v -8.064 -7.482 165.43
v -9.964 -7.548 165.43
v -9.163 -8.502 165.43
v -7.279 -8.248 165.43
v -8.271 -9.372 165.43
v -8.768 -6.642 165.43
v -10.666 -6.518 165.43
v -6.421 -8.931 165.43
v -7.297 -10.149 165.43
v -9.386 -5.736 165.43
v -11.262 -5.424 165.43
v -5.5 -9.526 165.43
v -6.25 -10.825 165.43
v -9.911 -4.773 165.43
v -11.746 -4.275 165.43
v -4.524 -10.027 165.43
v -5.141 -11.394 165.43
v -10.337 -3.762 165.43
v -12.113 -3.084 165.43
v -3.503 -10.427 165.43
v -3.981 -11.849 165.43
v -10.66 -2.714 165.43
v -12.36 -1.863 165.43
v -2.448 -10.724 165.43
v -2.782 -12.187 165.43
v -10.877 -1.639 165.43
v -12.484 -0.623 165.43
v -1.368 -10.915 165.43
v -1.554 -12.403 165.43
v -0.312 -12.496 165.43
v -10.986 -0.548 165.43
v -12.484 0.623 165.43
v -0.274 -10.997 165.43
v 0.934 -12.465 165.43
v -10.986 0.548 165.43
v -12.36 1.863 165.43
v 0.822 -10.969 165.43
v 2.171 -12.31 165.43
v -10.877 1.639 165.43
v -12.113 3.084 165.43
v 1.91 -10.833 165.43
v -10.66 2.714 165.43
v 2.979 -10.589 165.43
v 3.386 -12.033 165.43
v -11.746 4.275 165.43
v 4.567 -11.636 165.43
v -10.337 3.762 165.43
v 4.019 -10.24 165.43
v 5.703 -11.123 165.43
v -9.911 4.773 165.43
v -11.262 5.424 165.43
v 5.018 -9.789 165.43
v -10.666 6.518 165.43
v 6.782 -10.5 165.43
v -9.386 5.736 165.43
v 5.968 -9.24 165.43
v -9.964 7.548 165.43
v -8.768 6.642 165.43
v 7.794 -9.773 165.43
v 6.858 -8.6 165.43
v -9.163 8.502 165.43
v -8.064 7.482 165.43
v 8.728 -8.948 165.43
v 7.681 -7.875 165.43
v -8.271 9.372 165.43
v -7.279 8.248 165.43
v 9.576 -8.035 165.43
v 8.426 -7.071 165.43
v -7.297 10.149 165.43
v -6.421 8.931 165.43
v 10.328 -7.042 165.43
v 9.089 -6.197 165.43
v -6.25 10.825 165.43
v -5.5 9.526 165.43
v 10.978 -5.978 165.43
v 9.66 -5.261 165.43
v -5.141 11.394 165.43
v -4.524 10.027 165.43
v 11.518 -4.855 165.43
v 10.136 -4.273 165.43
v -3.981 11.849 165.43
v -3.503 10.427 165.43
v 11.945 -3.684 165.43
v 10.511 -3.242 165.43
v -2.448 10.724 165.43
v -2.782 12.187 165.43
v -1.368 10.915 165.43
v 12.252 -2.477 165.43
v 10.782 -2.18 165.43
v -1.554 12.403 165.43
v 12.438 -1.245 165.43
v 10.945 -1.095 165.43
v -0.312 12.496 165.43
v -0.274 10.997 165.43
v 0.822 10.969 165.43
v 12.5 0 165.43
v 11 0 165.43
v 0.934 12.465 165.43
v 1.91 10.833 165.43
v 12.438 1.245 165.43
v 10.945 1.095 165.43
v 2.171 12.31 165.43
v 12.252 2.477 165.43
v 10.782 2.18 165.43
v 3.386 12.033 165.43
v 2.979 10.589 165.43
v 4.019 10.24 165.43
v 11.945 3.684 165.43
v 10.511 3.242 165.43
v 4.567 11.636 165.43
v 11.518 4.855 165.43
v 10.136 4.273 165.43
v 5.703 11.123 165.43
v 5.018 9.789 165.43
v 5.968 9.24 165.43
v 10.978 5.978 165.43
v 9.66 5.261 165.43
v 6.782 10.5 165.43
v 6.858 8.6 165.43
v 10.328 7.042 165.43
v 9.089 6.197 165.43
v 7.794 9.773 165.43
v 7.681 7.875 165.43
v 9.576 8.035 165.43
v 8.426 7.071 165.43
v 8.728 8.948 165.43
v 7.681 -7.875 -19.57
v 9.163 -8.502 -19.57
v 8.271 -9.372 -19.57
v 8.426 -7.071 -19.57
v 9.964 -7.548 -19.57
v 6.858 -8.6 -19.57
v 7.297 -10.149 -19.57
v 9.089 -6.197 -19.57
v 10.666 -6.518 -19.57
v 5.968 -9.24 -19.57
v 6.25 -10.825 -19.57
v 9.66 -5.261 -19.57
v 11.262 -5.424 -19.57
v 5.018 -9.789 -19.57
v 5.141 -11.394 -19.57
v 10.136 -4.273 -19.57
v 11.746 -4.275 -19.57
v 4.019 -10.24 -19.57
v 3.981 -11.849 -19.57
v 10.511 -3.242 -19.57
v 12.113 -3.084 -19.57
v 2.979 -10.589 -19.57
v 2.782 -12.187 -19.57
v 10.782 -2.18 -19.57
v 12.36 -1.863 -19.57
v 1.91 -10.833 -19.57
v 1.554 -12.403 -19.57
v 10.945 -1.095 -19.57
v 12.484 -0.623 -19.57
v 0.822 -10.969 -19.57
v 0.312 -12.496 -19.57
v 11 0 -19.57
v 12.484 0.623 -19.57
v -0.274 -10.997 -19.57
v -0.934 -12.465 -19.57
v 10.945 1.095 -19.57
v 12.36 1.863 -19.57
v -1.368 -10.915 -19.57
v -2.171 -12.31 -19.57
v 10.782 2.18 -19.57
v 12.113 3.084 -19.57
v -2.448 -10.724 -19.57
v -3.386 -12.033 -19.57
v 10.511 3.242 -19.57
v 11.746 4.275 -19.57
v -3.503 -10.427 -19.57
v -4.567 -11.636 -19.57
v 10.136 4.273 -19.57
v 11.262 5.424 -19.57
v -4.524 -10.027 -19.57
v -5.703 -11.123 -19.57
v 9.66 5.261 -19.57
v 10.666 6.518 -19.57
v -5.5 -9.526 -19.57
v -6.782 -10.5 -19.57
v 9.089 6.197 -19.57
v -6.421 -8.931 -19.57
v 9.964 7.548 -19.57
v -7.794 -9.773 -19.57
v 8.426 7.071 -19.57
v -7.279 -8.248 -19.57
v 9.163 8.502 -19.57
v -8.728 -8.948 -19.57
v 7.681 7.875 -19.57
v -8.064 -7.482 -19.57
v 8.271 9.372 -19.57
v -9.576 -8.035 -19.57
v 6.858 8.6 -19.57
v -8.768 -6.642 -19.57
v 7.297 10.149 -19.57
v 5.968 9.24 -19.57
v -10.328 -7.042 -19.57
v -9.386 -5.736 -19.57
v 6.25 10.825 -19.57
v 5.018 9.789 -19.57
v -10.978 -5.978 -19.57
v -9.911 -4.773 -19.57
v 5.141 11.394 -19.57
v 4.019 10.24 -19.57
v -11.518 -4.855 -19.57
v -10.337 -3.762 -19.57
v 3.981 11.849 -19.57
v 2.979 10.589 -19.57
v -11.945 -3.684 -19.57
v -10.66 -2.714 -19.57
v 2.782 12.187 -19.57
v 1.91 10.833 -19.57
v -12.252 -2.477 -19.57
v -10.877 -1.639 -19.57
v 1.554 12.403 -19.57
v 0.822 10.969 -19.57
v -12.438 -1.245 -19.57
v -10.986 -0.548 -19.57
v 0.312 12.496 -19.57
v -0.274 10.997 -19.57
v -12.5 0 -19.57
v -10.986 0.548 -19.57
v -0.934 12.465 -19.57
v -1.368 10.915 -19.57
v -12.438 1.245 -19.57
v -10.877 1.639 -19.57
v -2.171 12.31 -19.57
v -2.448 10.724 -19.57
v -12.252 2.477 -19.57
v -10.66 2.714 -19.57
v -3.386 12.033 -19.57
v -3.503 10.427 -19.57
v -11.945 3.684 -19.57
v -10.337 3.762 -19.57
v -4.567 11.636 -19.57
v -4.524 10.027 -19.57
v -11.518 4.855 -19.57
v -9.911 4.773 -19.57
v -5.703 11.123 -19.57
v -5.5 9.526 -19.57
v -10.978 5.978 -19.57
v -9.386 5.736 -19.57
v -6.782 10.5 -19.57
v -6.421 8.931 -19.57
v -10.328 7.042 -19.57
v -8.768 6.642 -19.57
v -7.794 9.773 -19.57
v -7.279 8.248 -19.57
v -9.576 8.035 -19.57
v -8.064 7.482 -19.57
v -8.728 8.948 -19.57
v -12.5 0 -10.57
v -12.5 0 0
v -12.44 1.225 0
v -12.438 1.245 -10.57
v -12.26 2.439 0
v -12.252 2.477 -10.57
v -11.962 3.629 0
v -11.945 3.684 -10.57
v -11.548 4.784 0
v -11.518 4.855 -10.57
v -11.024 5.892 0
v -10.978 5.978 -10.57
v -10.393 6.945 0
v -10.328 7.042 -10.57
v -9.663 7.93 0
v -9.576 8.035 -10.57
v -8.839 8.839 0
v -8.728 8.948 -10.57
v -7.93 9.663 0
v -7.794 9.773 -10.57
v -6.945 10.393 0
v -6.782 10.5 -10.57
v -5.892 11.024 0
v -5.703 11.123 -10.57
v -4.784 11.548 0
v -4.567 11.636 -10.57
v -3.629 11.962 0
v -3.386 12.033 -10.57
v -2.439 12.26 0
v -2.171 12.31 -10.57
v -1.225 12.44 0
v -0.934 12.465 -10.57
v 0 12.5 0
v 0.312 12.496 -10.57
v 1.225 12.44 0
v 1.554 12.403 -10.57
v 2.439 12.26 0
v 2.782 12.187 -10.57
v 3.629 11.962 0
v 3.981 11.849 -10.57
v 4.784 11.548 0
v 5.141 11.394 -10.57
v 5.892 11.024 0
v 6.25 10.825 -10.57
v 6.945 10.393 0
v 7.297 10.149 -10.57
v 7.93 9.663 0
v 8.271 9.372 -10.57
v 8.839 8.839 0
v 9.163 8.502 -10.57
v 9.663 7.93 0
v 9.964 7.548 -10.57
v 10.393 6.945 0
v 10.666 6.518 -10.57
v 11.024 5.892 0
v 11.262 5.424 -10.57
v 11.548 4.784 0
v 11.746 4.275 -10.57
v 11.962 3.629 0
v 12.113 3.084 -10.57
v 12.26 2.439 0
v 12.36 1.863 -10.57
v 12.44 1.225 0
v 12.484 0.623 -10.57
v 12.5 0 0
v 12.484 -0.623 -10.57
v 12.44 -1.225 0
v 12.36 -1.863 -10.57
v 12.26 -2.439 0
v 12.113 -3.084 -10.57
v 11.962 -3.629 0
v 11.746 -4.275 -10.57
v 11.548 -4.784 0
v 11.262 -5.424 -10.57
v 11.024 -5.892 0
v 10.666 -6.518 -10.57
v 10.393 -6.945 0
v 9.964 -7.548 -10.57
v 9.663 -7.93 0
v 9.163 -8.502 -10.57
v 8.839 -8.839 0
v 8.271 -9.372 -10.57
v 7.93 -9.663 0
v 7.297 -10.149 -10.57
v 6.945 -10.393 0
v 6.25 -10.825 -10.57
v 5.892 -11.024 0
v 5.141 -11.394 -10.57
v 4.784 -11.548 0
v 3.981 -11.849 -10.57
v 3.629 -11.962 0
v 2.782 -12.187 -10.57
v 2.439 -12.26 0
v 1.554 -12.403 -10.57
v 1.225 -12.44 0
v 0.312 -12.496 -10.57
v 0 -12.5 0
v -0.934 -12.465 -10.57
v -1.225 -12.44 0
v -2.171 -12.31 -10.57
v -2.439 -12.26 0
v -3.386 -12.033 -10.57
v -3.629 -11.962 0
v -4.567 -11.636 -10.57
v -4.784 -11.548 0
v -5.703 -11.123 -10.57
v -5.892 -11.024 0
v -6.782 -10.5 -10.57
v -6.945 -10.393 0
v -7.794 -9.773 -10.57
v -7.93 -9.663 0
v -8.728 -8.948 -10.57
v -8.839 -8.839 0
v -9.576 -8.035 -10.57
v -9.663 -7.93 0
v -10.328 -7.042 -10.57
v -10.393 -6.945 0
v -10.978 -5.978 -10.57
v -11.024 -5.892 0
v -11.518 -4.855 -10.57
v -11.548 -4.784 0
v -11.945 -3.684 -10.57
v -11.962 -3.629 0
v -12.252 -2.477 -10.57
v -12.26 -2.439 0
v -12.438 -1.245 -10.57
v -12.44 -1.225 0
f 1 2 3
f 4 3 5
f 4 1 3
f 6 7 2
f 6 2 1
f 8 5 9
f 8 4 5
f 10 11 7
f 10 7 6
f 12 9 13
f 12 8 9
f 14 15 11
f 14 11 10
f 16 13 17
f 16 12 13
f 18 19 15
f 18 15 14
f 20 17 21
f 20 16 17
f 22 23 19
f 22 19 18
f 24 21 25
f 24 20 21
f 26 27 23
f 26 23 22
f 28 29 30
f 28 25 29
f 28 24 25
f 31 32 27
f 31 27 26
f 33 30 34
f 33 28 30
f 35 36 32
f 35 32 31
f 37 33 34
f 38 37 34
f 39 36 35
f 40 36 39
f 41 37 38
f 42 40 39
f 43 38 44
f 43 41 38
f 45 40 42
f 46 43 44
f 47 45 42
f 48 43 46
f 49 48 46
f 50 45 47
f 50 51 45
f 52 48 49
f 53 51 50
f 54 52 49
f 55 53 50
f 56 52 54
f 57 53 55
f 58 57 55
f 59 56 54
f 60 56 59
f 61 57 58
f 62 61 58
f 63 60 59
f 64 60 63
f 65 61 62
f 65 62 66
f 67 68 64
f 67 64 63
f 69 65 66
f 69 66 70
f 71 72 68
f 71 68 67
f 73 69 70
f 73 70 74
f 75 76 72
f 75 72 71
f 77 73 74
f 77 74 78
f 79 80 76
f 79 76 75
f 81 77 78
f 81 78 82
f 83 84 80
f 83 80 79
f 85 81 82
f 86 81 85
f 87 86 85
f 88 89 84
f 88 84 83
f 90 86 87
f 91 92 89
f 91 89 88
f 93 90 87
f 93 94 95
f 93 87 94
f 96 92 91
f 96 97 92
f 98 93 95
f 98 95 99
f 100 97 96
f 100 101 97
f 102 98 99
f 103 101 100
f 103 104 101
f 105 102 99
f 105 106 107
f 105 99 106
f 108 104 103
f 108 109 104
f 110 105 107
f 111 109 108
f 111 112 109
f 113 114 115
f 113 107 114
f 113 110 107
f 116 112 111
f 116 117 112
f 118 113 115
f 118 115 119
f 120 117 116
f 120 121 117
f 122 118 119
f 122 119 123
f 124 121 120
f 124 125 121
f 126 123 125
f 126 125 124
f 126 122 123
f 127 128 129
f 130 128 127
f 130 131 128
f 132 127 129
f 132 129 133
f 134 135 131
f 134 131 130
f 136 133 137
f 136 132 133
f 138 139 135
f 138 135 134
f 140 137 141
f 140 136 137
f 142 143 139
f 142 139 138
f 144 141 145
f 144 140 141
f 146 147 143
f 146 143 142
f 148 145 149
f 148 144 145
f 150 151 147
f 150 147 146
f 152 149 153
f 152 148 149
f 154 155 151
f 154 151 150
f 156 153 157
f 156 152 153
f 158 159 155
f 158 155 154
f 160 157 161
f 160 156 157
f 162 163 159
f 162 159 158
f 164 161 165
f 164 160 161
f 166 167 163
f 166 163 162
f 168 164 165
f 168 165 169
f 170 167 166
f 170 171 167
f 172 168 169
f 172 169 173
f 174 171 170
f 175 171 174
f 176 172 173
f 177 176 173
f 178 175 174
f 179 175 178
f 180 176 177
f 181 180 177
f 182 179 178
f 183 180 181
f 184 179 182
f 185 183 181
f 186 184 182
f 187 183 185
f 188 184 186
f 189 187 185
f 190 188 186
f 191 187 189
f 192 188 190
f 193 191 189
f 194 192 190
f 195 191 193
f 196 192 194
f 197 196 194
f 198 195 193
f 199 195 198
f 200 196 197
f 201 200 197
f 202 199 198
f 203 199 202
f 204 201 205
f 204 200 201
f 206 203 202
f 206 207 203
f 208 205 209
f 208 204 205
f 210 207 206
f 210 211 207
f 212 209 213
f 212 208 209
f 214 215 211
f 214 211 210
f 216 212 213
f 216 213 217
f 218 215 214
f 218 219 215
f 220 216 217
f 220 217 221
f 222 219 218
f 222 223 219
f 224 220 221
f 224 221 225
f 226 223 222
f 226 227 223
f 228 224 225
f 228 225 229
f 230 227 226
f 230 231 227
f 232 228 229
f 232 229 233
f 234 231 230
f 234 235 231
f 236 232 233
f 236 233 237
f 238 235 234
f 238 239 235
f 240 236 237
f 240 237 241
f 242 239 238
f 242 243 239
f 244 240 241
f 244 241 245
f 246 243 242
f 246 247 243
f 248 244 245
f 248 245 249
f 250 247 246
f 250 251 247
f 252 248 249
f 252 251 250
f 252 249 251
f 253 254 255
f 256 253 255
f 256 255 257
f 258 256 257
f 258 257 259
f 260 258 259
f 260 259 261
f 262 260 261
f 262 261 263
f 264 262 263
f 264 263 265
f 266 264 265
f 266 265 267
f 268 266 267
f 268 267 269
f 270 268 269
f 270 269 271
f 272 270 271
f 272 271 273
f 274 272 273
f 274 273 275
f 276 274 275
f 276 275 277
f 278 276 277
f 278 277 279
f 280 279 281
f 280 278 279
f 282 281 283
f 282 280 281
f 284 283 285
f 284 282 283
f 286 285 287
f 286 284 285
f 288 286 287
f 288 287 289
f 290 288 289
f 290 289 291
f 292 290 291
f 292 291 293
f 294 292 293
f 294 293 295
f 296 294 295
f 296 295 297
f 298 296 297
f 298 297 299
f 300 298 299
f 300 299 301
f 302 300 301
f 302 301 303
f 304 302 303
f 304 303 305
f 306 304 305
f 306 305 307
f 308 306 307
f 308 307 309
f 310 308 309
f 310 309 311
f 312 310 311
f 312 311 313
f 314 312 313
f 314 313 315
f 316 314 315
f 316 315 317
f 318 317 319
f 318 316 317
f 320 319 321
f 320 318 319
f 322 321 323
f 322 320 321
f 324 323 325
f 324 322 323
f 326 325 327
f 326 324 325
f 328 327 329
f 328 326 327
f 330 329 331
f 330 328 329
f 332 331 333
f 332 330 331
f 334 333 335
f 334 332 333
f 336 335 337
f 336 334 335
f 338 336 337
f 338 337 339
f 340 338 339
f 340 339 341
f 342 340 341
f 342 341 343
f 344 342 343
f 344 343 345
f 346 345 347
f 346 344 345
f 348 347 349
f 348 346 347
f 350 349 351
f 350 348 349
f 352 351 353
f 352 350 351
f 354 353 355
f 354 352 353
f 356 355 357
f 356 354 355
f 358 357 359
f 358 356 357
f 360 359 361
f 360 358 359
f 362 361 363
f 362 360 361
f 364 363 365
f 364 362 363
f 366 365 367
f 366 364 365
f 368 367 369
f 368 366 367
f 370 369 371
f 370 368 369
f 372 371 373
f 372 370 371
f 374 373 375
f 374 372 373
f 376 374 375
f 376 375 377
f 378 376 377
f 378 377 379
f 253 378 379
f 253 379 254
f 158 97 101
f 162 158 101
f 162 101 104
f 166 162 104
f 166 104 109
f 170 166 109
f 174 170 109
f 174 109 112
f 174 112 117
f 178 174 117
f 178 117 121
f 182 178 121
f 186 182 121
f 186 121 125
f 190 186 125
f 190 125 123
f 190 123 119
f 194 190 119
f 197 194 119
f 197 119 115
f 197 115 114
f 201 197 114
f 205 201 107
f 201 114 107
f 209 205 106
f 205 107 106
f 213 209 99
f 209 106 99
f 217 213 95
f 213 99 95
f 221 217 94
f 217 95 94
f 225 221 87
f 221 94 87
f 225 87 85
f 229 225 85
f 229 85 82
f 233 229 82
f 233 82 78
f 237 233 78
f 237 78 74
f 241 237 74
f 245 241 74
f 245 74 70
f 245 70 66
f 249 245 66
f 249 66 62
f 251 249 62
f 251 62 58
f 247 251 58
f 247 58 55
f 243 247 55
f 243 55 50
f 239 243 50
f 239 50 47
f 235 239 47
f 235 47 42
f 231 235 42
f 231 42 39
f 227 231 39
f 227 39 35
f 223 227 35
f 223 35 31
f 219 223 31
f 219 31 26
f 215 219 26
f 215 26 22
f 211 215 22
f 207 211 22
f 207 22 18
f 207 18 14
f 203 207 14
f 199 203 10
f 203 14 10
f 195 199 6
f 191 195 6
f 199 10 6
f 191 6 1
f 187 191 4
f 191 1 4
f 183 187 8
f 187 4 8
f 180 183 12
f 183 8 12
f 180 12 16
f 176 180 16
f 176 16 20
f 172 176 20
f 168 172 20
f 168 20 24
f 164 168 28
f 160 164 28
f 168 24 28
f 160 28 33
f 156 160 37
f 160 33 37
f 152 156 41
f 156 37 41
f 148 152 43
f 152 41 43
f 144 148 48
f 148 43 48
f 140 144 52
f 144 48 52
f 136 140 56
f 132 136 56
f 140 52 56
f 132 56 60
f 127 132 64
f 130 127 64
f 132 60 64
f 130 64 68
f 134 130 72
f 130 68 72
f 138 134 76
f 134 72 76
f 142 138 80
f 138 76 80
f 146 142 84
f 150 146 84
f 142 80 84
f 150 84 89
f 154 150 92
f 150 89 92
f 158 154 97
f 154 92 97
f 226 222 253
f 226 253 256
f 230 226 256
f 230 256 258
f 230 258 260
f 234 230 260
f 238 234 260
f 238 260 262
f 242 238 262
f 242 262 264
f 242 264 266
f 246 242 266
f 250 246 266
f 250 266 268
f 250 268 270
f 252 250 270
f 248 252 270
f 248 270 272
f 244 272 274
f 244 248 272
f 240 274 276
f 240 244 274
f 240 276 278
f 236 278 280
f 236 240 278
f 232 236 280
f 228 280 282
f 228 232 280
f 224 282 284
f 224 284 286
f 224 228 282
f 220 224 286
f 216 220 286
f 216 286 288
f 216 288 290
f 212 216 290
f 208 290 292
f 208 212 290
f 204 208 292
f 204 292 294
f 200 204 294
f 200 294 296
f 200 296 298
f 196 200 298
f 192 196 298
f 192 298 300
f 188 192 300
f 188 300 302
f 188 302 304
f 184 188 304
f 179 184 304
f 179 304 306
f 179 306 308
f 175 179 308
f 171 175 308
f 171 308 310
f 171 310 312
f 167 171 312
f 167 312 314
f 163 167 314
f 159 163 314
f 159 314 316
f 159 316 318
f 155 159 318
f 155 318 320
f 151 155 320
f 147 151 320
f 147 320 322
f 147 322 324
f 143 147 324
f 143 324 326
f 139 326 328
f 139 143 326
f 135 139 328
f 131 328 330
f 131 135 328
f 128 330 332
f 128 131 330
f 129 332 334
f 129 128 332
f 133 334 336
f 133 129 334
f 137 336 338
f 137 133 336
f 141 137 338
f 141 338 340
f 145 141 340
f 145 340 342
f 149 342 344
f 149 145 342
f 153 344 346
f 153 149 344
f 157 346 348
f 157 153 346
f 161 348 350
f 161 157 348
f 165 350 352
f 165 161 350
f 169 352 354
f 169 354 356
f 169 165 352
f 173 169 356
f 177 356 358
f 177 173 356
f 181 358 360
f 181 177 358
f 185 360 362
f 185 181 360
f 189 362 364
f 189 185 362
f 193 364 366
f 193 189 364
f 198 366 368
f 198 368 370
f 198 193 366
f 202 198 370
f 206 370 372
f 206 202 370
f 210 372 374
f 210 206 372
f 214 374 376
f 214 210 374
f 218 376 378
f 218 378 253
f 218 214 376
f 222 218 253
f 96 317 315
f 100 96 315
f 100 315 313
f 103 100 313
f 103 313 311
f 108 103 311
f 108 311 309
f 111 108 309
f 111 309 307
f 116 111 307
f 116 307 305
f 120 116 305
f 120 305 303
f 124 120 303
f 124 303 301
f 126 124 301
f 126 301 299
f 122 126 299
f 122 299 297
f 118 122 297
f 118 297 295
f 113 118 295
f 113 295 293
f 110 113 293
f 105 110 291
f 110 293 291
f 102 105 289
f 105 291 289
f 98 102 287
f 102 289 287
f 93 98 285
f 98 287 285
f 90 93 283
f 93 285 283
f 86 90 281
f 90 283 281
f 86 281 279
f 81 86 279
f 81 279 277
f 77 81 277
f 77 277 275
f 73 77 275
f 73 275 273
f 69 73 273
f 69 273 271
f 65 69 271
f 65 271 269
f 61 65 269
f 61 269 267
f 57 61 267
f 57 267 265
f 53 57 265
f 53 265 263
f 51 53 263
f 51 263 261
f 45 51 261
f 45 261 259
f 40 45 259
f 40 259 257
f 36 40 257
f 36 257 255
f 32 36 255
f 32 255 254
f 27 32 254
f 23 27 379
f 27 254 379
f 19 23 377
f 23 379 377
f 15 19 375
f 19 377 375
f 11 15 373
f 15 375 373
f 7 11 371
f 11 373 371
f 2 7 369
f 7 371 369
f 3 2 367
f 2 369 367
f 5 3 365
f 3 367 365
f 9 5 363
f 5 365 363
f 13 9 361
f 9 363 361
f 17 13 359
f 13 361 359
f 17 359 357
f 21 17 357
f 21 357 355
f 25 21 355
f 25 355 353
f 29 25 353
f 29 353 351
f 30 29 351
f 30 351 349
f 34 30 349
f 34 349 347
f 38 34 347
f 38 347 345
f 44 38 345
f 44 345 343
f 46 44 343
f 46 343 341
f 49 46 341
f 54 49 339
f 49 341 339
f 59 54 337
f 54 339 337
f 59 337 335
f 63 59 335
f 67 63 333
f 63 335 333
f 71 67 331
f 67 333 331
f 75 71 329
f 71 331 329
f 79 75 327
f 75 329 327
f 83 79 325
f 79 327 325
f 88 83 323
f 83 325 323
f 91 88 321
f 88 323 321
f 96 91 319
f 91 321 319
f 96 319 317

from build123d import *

# Parameters (mm, degrees)
SKETCH_1_R           = 12.5
EXTRUDE_2_DEPTH      = 235.43
SKETCH_2_R           = 9
CUT_EXTRUDE_1_DEPTH  = 235.43
EXTRUDE_START        = 15.57
SKETCH_3_R           = 12.5
EXTRUDE_3_DEPTH      = 15.57
SKETCH_4_R           = 9
CUT_EXTRUDE_2_DEPTH  = 20
EXTRUDE_START_2      = 9.93
SKETCH_5_R           = 12.5
EXTRUDE_4_DEPTH      = 9.93
SKETCH_6_R           = 9
CUT_EXTRUDE_3_DEPTH  = 10
SKETCH_7_R           = 26.85848727
CUT_EXTRUDE_4_DEPTH  = 14.93
SKETCH_8_R           = 12.5
EXTRUDE_5_DEPTH      = 9.93
SKETCH_9_R           = 9
CUT_EXTRUDE_5_DEPTH  = 10
SKETCH_10_R          = 37.193394561
CUT_EXTRUDE_6_DEPTH  = 0.22
SKETCH_11_R          = 43.187188263
CUT_EXTRUDE_7_DEPTH  = 0.71
SKETCH_12_R          = 12.5
EXTRUDE_6_DEPTH      = 15
CUT_EXTRUDE_START    = -15
SKETCH_13_R          = 9
CUT_EXTRUDE_8_DEPTH  = 15
SKETCH_14_R          = 46.427055536
CUT_EXTRUDE_9_DEPTH  = 85
SKETCH_15_R          = 11
CUT_EXTRUDE_10_DEPTH = 324


with BuildPart() as part:
    # 草图1 → 凸台-拉伸2 (new body)
    with BuildSketch(Plane.XY):
        Circle(SKETCH_1_R)
    extrude(amount=EXTRUDE_2_DEPTH)

    # 草图2 → 切除-拉伸1 (cut)
    with BuildSketch(Plane(origin=(0, 0, 0), x_dir=(-1, 0, 0), z_dir=(0, 0, -1))):
        Circle(SKETCH_2_R)
    extrude(amount=-CUT_EXTRUDE_1_DEPTH, mode=Mode.SUBTRACT)

    # 草图3 → 凸台-拉伸3 (add)
    with BuildSketch(Plane(origin=(0, 0, 0), x_dir=(-1, 0, 0), z_dir=(0, 0, -1)).offset(EXTRUDE_START)):
        Circle(SKETCH_3_R)
    extrude(amount=-EXTRUDE_3_DEPTH)

    # 草图4 → 切除-拉伸2 (cut)
    with BuildSketch(Plane(origin=(0, 0, -15.57), x_dir=(-1, 0, 0), z_dir=(0, 0, -1))):
        Circle(SKETCH_4_R)
    extrude(amount=-CUT_EXTRUDE_2_DEPTH, mode=Mode.SUBTRACT)

    # 草图5 → 凸台-拉伸4 (add)
    with BuildSketch(Plane(origin=(0, 0, -15.57), x_dir=(-1, 0, 0), z_dir=(0, 0, -1)).offset(EXTRUDE_START_2)):
        Circle(SKETCH_5_R)
    extrude(amount=-EXTRUDE_4_DEPTH)

    # 草图6 → 切除-拉伸3 (cut)
    with BuildSketch(Plane(origin=(0, 0, -25.5), x_dir=(-1, 0, 0), z_dir=(0, 0, -1))):
        Circle(SKETCH_6_R)
    extrude(amount=-CUT_EXTRUDE_3_DEPTH, mode=Mode.SUBTRACT)

    # 草图7 → 切除-拉伸4 (cut)
    with BuildSketch(Plane(origin=(0, 0, -25.5), x_dir=(-1, 0, 0), z_dir=(0, 0, -1))):
        Circle(SKETCH_7_R)
    extrude(amount=-CUT_EXTRUDE_4_DEPTH, mode=Mode.SUBTRACT)

    # 草图8 → 凸台-拉伸5 (add)
    with BuildSketch(Plane(origin=(0, 0, -10.57), x_dir=(-1, 0, 0), z_dir=(0, 0, -1)).offset(EXTRUDE_START_2)):
        Circle(SKETCH_8_R)
    extrude(amount=-EXTRUDE_5_DEPTH)

    # 草图9 → 切除-拉伸5 (cut)
    with BuildSketch(Plane(origin=(0, 0, -20.5), x_dir=(-1, 0, 0), z_dir=(0, 0, -1))):
        Circle(SKETCH_9_R)
    extrude(amount=-CUT_EXTRUDE_5_DEPTH, mode=Mode.SUBTRACT)

    # 草图10 → 切除-拉伸6 (cut)
    with BuildSketch(Plane(origin=(0, 0, -20.5), x_dir=(-1, 0, 0), z_dir=(0, 0, -1))):
        with Locations((7.201744855, 7.507888779)):
            Circle(SKETCH_10_R)
    extrude(amount=-CUT_EXTRUDE_6_DEPTH, mode=Mode.SUBTRACT)

    # 草图11 → 切除-拉伸7 (cut)
    with BuildSketch(Plane(origin=(0, 0, -20.28), x_dir=(-1, 0, 0), z_dir=(0, 0, -1))):
        with Locations((-1.225460352, 2.329416421)):
            Circle(SKETCH_11_R)
    extrude(amount=-CUT_EXTRUDE_7_DEPTH, mode=Mode.SUBTRACT)

    # 草图12 → 凸台-拉伸6 (add)
    with BuildSketch(Plane.XY.offset(235.43)):
        with Locations(Location((0, 0, 0), (0, 0, 180))):
            Circle(SKETCH_12_R)
    extrude(amount=EXTRUDE_6_DEPTH)

    # 草图13 → 切除-拉伸8 (cut)
    with BuildSketch(Plane.XY.offset(250.43).offset(CUT_EXTRUDE_START)):
        with Locations(Location((0, 0, 0), (0, 0, 180))):
            Circle(SKETCH_13_R)
    extrude(amount=CUT_EXTRUDE_8_DEPTH, mode=Mode.SUBTRACT)

    # 草图14 → 切除-拉伸9 (cut)
    with BuildSketch(Plane.XY.offset(250.43)):
        with Locations((-6.064552421, 3.817147789)):
            Circle(SKETCH_14_R)
    extrude(amount=-CUT_EXTRUDE_9_DEPTH, mode=Mode.SUBTRACT)

    # 草图15 → 切除-拉伸10 (cut)
    with BuildSketch(Plane.XY.offset(165.43)):
        Circle(SKETCH_15_R)
    extrude(amount=-CUT_EXTRUDE_10_DEPTH, mode=Mode.SUBTRACT)


solid = part.part
